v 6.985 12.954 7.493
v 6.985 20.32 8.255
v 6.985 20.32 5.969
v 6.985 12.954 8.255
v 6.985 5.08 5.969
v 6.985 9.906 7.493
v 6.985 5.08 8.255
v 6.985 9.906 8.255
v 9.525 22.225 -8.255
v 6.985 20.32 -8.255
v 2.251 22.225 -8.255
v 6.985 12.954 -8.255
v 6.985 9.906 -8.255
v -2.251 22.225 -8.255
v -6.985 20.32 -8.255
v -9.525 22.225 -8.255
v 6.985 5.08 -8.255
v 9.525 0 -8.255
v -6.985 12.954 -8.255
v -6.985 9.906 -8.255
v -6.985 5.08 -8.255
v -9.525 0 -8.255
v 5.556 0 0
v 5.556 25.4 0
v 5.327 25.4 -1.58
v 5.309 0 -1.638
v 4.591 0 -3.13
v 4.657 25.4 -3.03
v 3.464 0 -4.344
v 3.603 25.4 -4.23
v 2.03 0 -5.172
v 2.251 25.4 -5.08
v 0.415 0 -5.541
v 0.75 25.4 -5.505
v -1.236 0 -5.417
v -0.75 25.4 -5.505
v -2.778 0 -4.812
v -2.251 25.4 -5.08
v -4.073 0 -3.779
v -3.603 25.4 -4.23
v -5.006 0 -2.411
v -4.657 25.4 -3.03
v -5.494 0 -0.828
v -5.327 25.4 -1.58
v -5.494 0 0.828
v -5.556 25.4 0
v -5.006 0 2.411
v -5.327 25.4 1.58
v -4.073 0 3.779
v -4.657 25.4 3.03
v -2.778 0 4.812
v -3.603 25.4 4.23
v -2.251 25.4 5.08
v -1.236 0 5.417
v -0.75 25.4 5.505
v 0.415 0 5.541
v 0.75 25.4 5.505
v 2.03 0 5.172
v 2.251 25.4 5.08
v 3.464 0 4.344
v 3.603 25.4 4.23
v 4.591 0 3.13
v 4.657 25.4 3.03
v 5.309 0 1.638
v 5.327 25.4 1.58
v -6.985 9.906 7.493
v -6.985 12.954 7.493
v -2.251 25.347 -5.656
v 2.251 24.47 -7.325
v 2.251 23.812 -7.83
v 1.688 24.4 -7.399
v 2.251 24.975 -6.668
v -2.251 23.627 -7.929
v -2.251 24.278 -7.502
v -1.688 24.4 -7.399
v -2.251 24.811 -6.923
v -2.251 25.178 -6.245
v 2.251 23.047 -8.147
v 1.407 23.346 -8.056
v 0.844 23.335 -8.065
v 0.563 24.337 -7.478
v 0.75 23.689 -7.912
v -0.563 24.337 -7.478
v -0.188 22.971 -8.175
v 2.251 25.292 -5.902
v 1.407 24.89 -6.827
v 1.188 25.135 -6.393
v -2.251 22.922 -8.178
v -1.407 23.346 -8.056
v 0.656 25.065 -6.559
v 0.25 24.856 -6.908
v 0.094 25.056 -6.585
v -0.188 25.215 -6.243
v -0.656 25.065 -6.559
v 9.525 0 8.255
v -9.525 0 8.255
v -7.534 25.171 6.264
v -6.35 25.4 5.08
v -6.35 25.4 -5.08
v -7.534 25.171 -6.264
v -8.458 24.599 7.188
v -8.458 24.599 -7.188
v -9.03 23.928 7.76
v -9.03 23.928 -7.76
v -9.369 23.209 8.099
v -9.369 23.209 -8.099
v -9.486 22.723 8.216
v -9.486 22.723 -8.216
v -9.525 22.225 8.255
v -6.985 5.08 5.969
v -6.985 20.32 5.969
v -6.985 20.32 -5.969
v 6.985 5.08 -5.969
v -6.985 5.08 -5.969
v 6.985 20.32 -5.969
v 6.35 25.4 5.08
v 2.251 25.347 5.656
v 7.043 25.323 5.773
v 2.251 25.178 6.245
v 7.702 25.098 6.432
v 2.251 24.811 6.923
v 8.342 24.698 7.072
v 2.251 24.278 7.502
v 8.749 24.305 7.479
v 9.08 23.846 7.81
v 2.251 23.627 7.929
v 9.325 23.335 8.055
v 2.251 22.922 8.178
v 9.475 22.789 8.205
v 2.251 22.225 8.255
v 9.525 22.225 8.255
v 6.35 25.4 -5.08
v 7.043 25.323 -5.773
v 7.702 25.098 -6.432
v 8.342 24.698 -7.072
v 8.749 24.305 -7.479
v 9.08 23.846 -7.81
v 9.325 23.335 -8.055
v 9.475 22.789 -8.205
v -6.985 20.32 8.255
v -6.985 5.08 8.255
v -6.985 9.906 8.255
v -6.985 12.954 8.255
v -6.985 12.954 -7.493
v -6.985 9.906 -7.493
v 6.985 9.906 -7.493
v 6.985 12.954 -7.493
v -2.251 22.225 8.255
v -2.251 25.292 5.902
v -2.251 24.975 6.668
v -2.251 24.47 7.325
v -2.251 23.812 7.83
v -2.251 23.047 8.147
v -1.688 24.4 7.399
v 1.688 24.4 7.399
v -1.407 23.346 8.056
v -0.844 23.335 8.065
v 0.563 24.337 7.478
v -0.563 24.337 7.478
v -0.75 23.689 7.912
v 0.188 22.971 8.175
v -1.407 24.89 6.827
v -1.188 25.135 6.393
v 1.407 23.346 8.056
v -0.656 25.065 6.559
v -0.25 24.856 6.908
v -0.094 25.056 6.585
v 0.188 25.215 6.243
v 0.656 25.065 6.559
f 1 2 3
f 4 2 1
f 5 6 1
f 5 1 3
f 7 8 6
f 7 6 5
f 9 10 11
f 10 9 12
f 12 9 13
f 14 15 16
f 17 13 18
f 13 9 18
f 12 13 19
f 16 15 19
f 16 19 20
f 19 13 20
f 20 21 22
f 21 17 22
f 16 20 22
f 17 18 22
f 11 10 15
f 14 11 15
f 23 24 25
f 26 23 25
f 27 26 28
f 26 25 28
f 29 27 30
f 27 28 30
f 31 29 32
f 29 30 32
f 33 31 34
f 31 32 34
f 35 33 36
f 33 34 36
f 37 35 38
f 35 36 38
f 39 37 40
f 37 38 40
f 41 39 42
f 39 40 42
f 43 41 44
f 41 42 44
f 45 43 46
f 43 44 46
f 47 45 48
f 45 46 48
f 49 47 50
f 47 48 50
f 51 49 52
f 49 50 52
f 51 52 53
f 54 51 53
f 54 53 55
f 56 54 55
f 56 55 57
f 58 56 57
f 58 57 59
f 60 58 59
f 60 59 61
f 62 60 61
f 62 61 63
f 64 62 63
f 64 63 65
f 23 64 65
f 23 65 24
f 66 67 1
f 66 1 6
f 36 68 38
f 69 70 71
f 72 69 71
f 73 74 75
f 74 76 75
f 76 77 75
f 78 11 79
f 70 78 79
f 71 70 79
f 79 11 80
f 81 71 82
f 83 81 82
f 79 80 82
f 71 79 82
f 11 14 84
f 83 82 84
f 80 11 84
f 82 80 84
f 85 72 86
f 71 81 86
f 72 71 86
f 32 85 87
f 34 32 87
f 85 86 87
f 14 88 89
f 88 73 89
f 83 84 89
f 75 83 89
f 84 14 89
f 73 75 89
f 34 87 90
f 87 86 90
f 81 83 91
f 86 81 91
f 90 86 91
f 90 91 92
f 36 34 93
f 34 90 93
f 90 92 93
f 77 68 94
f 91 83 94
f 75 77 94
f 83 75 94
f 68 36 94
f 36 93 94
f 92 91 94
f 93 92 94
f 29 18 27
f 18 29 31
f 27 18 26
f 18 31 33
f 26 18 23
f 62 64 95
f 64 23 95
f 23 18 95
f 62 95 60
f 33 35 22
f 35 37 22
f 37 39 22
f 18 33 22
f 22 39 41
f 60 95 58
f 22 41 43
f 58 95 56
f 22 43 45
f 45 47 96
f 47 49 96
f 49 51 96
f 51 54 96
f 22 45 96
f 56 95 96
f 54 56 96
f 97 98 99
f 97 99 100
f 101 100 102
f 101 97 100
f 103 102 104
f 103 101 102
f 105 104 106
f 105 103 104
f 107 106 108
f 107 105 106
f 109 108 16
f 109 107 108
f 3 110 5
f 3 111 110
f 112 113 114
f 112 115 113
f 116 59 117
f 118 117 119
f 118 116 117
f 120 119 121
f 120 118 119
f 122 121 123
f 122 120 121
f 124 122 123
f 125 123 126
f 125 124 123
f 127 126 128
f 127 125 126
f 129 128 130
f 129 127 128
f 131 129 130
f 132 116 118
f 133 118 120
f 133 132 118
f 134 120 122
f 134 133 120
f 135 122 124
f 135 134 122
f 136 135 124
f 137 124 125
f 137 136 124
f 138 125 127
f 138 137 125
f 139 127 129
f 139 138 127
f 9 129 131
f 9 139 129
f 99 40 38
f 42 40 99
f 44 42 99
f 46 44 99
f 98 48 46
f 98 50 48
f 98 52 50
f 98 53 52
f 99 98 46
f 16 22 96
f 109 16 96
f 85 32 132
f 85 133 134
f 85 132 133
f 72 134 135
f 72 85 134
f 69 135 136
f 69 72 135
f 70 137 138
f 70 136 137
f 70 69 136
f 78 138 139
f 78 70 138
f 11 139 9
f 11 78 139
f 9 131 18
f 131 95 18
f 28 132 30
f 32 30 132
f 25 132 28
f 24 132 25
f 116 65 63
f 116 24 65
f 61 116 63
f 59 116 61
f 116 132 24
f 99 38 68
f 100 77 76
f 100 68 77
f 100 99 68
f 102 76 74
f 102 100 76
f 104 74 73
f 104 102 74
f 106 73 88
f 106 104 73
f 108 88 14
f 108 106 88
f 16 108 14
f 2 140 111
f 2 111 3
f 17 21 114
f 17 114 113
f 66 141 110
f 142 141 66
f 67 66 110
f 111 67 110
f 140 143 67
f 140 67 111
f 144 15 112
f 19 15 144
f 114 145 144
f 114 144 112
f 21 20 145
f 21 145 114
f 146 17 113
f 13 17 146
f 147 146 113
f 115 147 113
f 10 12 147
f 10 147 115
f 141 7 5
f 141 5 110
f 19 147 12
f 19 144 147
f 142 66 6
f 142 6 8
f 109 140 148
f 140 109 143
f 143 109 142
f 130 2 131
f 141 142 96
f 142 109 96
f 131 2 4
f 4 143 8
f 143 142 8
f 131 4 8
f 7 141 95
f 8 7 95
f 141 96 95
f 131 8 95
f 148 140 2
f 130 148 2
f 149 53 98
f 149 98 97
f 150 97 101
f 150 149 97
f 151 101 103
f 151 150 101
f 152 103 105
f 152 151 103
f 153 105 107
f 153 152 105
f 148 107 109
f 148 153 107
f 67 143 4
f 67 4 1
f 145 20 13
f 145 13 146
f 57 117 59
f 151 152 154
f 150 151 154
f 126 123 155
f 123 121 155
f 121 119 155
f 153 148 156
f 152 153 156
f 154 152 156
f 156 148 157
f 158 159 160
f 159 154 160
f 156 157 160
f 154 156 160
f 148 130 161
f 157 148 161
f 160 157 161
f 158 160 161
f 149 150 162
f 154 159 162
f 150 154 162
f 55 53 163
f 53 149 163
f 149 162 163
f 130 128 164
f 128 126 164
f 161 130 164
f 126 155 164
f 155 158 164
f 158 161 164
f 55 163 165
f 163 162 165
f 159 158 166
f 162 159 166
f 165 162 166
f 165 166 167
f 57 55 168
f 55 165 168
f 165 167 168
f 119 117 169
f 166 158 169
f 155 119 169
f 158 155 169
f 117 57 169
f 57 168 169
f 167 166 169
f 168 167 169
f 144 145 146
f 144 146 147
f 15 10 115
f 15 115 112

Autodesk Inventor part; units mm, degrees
ref_plane "YZ Plane" through (0, 0, 0) normal (1, 0, 0) x (0, 1, 0)
ref_plane "XZ Plane" through (0, 0, 0) normal (0, 1, 0) x (-1, 0, 0)
ref_plane "XY Plane" through (0, 0, 0) normal (0, 0, 1) x (1, 0, 0)
sketch "Sketch1" plane through (0, 0, 0) normal (0, 1, 0) x (-1, 0, 0)
  line L0 (-9.525, -8.255) -> (9.525, -8.255)
  line L1 (9.525, -8.255) -> (9.525, 8.255)
  line L2 (9.525, 8.255) -> (-9.525, 8.255)
  line L3 (-9.525, 8.255) -> (-9.525, -8.255)
  line L4 (-9.525, -8.255) -> (9.525, 8.255) construction
  line L5 (9.525, -8.255) -> (-9.525, 8.255) construction
  point P0 (0, 0)
  dimension "d9" = 19.05
  dimension "d10" = 16.51
extrude "Extrusion3" add sketch "Sketch1" along normal blind 25.4
sketch "actual_circle" plane through (0, 25.4, 0) normal (0, 1, 0) x (1, 0, 0)
  circle A0 centre (0, 0) radius 5.5563
  dimension "d27" = 11.1125
extrude "Extrusion6" cut sketch "actual_circle" against normal blind 50.8
sketch "circle" plane through (-9.525, 0, 8.255) normal (0, 0, 1) x (1, 0, 0)
  line L0 (2.54, 20.32) -> (16.51, 20.32)
  line L1 (16.51, 20.32) -> (16.51, 5.08)
  line L2 (16.51, 5.08) -> (2.54, 5.08)
  line L3 (2.54, 5.08) -> (2.54, 20.32)
  line L4 (0, 25.4) -> (19.05, 25.4) projected
  line L5 (0, 0) -> (0, 25.4) projected
  point P0 (9.525, 0)
  dimension "d32" = 13.97
  dimension "d33" = 15.24
  dimension "d34" = 5.08
  dimension "d35" = 2.54
extrude "Extrusion7" cut sketch "circle" against normal blind 2.286
sketch "Sketch7" plane through (9.525, 0, -8.255) normal (0, 0, -1) x (-1, 0, 0)
  line L0 (2.54, 20.32) -> (16.51, 20.32)
  line L1 (16.51, 20.32) -> (16.51, 5.08)
  line L2 (16.51, 5.08) -> (2.54, 5.08)
  line L3 (2.54, 5.08) -> (2.54, 20.32)
  line L4 (0, 0) -> (0, 25.4) projected
  line L5 (0, 25.4) -> (19.05, 25.4) projected
  point P0 (9.525, 0)
  dimension "d38" = 13.97
  dimension "d39" = 15.24
  dimension "d40" = 2.54
  dimension "d41" = 5.08
extrude "Extrusion8" cut sketch "Sketch7" against normal blind 2.286
sketch "Lock" plane through (-6.985, 5.08, -8.255) normal (1, 0, 0) x (0, 0, -1)
  line L0 (-0.762, 7.874) -> (0, 7.874)
  line L1 (0, 7.874) -> (0, 4.826)
  line L2 (0, 4.826) -> (-0.762, 4.826)
  line L3 (-0.762, 4.826) -> (-0.762, 7.874)
  line L4 (-2.286, 15.24) -> (-2.286, 0) projected
  point P0 (-8.255, -5.08)
  point P1 (0, 15.24)
  dimension "d44" = 0.762
  dimension "d45" = 3.048
  dimension "d46" = 7.366
  dimension "d47" = 1.524
extrude "Extrusion9" add sketch "Lock" along normal blind 13.97
sketch "Sketch9" plane through (-6.985, 5.08, 8.255) normal (1, 0, 0) x (0, 0, -1)
  line L0 (0, 7.874) -> (0.762, 7.874)
  line L1 (0.762, 7.874) -> (0.762, 4.826)
  line L2 (0.762, 4.826) -> (0, 4.826)
  line L3 (0, 4.826) -> (0, 7.874)
  line L4 (0, 0) -> (0, 15.24) projected
  point P0 (8.255, -5.08)
  dimension "d50" = 0.762
  dimension "d51" = 3.048
  dimension "d52" = 0
  dimension "d53" = 7.366
extrude "Extrusion10" add sketch "Sketch9" along normal blind 13.97
fillet "Fillet1" radius 3.175 4 edges at (-9.525, 25.4, 0) (9.525, 25.4, 0) (0, 25.4, 8.255) (0, 25.4, -8.255)
properties part number "Weird_Box_Lina_Made_Me_Make_Final"
